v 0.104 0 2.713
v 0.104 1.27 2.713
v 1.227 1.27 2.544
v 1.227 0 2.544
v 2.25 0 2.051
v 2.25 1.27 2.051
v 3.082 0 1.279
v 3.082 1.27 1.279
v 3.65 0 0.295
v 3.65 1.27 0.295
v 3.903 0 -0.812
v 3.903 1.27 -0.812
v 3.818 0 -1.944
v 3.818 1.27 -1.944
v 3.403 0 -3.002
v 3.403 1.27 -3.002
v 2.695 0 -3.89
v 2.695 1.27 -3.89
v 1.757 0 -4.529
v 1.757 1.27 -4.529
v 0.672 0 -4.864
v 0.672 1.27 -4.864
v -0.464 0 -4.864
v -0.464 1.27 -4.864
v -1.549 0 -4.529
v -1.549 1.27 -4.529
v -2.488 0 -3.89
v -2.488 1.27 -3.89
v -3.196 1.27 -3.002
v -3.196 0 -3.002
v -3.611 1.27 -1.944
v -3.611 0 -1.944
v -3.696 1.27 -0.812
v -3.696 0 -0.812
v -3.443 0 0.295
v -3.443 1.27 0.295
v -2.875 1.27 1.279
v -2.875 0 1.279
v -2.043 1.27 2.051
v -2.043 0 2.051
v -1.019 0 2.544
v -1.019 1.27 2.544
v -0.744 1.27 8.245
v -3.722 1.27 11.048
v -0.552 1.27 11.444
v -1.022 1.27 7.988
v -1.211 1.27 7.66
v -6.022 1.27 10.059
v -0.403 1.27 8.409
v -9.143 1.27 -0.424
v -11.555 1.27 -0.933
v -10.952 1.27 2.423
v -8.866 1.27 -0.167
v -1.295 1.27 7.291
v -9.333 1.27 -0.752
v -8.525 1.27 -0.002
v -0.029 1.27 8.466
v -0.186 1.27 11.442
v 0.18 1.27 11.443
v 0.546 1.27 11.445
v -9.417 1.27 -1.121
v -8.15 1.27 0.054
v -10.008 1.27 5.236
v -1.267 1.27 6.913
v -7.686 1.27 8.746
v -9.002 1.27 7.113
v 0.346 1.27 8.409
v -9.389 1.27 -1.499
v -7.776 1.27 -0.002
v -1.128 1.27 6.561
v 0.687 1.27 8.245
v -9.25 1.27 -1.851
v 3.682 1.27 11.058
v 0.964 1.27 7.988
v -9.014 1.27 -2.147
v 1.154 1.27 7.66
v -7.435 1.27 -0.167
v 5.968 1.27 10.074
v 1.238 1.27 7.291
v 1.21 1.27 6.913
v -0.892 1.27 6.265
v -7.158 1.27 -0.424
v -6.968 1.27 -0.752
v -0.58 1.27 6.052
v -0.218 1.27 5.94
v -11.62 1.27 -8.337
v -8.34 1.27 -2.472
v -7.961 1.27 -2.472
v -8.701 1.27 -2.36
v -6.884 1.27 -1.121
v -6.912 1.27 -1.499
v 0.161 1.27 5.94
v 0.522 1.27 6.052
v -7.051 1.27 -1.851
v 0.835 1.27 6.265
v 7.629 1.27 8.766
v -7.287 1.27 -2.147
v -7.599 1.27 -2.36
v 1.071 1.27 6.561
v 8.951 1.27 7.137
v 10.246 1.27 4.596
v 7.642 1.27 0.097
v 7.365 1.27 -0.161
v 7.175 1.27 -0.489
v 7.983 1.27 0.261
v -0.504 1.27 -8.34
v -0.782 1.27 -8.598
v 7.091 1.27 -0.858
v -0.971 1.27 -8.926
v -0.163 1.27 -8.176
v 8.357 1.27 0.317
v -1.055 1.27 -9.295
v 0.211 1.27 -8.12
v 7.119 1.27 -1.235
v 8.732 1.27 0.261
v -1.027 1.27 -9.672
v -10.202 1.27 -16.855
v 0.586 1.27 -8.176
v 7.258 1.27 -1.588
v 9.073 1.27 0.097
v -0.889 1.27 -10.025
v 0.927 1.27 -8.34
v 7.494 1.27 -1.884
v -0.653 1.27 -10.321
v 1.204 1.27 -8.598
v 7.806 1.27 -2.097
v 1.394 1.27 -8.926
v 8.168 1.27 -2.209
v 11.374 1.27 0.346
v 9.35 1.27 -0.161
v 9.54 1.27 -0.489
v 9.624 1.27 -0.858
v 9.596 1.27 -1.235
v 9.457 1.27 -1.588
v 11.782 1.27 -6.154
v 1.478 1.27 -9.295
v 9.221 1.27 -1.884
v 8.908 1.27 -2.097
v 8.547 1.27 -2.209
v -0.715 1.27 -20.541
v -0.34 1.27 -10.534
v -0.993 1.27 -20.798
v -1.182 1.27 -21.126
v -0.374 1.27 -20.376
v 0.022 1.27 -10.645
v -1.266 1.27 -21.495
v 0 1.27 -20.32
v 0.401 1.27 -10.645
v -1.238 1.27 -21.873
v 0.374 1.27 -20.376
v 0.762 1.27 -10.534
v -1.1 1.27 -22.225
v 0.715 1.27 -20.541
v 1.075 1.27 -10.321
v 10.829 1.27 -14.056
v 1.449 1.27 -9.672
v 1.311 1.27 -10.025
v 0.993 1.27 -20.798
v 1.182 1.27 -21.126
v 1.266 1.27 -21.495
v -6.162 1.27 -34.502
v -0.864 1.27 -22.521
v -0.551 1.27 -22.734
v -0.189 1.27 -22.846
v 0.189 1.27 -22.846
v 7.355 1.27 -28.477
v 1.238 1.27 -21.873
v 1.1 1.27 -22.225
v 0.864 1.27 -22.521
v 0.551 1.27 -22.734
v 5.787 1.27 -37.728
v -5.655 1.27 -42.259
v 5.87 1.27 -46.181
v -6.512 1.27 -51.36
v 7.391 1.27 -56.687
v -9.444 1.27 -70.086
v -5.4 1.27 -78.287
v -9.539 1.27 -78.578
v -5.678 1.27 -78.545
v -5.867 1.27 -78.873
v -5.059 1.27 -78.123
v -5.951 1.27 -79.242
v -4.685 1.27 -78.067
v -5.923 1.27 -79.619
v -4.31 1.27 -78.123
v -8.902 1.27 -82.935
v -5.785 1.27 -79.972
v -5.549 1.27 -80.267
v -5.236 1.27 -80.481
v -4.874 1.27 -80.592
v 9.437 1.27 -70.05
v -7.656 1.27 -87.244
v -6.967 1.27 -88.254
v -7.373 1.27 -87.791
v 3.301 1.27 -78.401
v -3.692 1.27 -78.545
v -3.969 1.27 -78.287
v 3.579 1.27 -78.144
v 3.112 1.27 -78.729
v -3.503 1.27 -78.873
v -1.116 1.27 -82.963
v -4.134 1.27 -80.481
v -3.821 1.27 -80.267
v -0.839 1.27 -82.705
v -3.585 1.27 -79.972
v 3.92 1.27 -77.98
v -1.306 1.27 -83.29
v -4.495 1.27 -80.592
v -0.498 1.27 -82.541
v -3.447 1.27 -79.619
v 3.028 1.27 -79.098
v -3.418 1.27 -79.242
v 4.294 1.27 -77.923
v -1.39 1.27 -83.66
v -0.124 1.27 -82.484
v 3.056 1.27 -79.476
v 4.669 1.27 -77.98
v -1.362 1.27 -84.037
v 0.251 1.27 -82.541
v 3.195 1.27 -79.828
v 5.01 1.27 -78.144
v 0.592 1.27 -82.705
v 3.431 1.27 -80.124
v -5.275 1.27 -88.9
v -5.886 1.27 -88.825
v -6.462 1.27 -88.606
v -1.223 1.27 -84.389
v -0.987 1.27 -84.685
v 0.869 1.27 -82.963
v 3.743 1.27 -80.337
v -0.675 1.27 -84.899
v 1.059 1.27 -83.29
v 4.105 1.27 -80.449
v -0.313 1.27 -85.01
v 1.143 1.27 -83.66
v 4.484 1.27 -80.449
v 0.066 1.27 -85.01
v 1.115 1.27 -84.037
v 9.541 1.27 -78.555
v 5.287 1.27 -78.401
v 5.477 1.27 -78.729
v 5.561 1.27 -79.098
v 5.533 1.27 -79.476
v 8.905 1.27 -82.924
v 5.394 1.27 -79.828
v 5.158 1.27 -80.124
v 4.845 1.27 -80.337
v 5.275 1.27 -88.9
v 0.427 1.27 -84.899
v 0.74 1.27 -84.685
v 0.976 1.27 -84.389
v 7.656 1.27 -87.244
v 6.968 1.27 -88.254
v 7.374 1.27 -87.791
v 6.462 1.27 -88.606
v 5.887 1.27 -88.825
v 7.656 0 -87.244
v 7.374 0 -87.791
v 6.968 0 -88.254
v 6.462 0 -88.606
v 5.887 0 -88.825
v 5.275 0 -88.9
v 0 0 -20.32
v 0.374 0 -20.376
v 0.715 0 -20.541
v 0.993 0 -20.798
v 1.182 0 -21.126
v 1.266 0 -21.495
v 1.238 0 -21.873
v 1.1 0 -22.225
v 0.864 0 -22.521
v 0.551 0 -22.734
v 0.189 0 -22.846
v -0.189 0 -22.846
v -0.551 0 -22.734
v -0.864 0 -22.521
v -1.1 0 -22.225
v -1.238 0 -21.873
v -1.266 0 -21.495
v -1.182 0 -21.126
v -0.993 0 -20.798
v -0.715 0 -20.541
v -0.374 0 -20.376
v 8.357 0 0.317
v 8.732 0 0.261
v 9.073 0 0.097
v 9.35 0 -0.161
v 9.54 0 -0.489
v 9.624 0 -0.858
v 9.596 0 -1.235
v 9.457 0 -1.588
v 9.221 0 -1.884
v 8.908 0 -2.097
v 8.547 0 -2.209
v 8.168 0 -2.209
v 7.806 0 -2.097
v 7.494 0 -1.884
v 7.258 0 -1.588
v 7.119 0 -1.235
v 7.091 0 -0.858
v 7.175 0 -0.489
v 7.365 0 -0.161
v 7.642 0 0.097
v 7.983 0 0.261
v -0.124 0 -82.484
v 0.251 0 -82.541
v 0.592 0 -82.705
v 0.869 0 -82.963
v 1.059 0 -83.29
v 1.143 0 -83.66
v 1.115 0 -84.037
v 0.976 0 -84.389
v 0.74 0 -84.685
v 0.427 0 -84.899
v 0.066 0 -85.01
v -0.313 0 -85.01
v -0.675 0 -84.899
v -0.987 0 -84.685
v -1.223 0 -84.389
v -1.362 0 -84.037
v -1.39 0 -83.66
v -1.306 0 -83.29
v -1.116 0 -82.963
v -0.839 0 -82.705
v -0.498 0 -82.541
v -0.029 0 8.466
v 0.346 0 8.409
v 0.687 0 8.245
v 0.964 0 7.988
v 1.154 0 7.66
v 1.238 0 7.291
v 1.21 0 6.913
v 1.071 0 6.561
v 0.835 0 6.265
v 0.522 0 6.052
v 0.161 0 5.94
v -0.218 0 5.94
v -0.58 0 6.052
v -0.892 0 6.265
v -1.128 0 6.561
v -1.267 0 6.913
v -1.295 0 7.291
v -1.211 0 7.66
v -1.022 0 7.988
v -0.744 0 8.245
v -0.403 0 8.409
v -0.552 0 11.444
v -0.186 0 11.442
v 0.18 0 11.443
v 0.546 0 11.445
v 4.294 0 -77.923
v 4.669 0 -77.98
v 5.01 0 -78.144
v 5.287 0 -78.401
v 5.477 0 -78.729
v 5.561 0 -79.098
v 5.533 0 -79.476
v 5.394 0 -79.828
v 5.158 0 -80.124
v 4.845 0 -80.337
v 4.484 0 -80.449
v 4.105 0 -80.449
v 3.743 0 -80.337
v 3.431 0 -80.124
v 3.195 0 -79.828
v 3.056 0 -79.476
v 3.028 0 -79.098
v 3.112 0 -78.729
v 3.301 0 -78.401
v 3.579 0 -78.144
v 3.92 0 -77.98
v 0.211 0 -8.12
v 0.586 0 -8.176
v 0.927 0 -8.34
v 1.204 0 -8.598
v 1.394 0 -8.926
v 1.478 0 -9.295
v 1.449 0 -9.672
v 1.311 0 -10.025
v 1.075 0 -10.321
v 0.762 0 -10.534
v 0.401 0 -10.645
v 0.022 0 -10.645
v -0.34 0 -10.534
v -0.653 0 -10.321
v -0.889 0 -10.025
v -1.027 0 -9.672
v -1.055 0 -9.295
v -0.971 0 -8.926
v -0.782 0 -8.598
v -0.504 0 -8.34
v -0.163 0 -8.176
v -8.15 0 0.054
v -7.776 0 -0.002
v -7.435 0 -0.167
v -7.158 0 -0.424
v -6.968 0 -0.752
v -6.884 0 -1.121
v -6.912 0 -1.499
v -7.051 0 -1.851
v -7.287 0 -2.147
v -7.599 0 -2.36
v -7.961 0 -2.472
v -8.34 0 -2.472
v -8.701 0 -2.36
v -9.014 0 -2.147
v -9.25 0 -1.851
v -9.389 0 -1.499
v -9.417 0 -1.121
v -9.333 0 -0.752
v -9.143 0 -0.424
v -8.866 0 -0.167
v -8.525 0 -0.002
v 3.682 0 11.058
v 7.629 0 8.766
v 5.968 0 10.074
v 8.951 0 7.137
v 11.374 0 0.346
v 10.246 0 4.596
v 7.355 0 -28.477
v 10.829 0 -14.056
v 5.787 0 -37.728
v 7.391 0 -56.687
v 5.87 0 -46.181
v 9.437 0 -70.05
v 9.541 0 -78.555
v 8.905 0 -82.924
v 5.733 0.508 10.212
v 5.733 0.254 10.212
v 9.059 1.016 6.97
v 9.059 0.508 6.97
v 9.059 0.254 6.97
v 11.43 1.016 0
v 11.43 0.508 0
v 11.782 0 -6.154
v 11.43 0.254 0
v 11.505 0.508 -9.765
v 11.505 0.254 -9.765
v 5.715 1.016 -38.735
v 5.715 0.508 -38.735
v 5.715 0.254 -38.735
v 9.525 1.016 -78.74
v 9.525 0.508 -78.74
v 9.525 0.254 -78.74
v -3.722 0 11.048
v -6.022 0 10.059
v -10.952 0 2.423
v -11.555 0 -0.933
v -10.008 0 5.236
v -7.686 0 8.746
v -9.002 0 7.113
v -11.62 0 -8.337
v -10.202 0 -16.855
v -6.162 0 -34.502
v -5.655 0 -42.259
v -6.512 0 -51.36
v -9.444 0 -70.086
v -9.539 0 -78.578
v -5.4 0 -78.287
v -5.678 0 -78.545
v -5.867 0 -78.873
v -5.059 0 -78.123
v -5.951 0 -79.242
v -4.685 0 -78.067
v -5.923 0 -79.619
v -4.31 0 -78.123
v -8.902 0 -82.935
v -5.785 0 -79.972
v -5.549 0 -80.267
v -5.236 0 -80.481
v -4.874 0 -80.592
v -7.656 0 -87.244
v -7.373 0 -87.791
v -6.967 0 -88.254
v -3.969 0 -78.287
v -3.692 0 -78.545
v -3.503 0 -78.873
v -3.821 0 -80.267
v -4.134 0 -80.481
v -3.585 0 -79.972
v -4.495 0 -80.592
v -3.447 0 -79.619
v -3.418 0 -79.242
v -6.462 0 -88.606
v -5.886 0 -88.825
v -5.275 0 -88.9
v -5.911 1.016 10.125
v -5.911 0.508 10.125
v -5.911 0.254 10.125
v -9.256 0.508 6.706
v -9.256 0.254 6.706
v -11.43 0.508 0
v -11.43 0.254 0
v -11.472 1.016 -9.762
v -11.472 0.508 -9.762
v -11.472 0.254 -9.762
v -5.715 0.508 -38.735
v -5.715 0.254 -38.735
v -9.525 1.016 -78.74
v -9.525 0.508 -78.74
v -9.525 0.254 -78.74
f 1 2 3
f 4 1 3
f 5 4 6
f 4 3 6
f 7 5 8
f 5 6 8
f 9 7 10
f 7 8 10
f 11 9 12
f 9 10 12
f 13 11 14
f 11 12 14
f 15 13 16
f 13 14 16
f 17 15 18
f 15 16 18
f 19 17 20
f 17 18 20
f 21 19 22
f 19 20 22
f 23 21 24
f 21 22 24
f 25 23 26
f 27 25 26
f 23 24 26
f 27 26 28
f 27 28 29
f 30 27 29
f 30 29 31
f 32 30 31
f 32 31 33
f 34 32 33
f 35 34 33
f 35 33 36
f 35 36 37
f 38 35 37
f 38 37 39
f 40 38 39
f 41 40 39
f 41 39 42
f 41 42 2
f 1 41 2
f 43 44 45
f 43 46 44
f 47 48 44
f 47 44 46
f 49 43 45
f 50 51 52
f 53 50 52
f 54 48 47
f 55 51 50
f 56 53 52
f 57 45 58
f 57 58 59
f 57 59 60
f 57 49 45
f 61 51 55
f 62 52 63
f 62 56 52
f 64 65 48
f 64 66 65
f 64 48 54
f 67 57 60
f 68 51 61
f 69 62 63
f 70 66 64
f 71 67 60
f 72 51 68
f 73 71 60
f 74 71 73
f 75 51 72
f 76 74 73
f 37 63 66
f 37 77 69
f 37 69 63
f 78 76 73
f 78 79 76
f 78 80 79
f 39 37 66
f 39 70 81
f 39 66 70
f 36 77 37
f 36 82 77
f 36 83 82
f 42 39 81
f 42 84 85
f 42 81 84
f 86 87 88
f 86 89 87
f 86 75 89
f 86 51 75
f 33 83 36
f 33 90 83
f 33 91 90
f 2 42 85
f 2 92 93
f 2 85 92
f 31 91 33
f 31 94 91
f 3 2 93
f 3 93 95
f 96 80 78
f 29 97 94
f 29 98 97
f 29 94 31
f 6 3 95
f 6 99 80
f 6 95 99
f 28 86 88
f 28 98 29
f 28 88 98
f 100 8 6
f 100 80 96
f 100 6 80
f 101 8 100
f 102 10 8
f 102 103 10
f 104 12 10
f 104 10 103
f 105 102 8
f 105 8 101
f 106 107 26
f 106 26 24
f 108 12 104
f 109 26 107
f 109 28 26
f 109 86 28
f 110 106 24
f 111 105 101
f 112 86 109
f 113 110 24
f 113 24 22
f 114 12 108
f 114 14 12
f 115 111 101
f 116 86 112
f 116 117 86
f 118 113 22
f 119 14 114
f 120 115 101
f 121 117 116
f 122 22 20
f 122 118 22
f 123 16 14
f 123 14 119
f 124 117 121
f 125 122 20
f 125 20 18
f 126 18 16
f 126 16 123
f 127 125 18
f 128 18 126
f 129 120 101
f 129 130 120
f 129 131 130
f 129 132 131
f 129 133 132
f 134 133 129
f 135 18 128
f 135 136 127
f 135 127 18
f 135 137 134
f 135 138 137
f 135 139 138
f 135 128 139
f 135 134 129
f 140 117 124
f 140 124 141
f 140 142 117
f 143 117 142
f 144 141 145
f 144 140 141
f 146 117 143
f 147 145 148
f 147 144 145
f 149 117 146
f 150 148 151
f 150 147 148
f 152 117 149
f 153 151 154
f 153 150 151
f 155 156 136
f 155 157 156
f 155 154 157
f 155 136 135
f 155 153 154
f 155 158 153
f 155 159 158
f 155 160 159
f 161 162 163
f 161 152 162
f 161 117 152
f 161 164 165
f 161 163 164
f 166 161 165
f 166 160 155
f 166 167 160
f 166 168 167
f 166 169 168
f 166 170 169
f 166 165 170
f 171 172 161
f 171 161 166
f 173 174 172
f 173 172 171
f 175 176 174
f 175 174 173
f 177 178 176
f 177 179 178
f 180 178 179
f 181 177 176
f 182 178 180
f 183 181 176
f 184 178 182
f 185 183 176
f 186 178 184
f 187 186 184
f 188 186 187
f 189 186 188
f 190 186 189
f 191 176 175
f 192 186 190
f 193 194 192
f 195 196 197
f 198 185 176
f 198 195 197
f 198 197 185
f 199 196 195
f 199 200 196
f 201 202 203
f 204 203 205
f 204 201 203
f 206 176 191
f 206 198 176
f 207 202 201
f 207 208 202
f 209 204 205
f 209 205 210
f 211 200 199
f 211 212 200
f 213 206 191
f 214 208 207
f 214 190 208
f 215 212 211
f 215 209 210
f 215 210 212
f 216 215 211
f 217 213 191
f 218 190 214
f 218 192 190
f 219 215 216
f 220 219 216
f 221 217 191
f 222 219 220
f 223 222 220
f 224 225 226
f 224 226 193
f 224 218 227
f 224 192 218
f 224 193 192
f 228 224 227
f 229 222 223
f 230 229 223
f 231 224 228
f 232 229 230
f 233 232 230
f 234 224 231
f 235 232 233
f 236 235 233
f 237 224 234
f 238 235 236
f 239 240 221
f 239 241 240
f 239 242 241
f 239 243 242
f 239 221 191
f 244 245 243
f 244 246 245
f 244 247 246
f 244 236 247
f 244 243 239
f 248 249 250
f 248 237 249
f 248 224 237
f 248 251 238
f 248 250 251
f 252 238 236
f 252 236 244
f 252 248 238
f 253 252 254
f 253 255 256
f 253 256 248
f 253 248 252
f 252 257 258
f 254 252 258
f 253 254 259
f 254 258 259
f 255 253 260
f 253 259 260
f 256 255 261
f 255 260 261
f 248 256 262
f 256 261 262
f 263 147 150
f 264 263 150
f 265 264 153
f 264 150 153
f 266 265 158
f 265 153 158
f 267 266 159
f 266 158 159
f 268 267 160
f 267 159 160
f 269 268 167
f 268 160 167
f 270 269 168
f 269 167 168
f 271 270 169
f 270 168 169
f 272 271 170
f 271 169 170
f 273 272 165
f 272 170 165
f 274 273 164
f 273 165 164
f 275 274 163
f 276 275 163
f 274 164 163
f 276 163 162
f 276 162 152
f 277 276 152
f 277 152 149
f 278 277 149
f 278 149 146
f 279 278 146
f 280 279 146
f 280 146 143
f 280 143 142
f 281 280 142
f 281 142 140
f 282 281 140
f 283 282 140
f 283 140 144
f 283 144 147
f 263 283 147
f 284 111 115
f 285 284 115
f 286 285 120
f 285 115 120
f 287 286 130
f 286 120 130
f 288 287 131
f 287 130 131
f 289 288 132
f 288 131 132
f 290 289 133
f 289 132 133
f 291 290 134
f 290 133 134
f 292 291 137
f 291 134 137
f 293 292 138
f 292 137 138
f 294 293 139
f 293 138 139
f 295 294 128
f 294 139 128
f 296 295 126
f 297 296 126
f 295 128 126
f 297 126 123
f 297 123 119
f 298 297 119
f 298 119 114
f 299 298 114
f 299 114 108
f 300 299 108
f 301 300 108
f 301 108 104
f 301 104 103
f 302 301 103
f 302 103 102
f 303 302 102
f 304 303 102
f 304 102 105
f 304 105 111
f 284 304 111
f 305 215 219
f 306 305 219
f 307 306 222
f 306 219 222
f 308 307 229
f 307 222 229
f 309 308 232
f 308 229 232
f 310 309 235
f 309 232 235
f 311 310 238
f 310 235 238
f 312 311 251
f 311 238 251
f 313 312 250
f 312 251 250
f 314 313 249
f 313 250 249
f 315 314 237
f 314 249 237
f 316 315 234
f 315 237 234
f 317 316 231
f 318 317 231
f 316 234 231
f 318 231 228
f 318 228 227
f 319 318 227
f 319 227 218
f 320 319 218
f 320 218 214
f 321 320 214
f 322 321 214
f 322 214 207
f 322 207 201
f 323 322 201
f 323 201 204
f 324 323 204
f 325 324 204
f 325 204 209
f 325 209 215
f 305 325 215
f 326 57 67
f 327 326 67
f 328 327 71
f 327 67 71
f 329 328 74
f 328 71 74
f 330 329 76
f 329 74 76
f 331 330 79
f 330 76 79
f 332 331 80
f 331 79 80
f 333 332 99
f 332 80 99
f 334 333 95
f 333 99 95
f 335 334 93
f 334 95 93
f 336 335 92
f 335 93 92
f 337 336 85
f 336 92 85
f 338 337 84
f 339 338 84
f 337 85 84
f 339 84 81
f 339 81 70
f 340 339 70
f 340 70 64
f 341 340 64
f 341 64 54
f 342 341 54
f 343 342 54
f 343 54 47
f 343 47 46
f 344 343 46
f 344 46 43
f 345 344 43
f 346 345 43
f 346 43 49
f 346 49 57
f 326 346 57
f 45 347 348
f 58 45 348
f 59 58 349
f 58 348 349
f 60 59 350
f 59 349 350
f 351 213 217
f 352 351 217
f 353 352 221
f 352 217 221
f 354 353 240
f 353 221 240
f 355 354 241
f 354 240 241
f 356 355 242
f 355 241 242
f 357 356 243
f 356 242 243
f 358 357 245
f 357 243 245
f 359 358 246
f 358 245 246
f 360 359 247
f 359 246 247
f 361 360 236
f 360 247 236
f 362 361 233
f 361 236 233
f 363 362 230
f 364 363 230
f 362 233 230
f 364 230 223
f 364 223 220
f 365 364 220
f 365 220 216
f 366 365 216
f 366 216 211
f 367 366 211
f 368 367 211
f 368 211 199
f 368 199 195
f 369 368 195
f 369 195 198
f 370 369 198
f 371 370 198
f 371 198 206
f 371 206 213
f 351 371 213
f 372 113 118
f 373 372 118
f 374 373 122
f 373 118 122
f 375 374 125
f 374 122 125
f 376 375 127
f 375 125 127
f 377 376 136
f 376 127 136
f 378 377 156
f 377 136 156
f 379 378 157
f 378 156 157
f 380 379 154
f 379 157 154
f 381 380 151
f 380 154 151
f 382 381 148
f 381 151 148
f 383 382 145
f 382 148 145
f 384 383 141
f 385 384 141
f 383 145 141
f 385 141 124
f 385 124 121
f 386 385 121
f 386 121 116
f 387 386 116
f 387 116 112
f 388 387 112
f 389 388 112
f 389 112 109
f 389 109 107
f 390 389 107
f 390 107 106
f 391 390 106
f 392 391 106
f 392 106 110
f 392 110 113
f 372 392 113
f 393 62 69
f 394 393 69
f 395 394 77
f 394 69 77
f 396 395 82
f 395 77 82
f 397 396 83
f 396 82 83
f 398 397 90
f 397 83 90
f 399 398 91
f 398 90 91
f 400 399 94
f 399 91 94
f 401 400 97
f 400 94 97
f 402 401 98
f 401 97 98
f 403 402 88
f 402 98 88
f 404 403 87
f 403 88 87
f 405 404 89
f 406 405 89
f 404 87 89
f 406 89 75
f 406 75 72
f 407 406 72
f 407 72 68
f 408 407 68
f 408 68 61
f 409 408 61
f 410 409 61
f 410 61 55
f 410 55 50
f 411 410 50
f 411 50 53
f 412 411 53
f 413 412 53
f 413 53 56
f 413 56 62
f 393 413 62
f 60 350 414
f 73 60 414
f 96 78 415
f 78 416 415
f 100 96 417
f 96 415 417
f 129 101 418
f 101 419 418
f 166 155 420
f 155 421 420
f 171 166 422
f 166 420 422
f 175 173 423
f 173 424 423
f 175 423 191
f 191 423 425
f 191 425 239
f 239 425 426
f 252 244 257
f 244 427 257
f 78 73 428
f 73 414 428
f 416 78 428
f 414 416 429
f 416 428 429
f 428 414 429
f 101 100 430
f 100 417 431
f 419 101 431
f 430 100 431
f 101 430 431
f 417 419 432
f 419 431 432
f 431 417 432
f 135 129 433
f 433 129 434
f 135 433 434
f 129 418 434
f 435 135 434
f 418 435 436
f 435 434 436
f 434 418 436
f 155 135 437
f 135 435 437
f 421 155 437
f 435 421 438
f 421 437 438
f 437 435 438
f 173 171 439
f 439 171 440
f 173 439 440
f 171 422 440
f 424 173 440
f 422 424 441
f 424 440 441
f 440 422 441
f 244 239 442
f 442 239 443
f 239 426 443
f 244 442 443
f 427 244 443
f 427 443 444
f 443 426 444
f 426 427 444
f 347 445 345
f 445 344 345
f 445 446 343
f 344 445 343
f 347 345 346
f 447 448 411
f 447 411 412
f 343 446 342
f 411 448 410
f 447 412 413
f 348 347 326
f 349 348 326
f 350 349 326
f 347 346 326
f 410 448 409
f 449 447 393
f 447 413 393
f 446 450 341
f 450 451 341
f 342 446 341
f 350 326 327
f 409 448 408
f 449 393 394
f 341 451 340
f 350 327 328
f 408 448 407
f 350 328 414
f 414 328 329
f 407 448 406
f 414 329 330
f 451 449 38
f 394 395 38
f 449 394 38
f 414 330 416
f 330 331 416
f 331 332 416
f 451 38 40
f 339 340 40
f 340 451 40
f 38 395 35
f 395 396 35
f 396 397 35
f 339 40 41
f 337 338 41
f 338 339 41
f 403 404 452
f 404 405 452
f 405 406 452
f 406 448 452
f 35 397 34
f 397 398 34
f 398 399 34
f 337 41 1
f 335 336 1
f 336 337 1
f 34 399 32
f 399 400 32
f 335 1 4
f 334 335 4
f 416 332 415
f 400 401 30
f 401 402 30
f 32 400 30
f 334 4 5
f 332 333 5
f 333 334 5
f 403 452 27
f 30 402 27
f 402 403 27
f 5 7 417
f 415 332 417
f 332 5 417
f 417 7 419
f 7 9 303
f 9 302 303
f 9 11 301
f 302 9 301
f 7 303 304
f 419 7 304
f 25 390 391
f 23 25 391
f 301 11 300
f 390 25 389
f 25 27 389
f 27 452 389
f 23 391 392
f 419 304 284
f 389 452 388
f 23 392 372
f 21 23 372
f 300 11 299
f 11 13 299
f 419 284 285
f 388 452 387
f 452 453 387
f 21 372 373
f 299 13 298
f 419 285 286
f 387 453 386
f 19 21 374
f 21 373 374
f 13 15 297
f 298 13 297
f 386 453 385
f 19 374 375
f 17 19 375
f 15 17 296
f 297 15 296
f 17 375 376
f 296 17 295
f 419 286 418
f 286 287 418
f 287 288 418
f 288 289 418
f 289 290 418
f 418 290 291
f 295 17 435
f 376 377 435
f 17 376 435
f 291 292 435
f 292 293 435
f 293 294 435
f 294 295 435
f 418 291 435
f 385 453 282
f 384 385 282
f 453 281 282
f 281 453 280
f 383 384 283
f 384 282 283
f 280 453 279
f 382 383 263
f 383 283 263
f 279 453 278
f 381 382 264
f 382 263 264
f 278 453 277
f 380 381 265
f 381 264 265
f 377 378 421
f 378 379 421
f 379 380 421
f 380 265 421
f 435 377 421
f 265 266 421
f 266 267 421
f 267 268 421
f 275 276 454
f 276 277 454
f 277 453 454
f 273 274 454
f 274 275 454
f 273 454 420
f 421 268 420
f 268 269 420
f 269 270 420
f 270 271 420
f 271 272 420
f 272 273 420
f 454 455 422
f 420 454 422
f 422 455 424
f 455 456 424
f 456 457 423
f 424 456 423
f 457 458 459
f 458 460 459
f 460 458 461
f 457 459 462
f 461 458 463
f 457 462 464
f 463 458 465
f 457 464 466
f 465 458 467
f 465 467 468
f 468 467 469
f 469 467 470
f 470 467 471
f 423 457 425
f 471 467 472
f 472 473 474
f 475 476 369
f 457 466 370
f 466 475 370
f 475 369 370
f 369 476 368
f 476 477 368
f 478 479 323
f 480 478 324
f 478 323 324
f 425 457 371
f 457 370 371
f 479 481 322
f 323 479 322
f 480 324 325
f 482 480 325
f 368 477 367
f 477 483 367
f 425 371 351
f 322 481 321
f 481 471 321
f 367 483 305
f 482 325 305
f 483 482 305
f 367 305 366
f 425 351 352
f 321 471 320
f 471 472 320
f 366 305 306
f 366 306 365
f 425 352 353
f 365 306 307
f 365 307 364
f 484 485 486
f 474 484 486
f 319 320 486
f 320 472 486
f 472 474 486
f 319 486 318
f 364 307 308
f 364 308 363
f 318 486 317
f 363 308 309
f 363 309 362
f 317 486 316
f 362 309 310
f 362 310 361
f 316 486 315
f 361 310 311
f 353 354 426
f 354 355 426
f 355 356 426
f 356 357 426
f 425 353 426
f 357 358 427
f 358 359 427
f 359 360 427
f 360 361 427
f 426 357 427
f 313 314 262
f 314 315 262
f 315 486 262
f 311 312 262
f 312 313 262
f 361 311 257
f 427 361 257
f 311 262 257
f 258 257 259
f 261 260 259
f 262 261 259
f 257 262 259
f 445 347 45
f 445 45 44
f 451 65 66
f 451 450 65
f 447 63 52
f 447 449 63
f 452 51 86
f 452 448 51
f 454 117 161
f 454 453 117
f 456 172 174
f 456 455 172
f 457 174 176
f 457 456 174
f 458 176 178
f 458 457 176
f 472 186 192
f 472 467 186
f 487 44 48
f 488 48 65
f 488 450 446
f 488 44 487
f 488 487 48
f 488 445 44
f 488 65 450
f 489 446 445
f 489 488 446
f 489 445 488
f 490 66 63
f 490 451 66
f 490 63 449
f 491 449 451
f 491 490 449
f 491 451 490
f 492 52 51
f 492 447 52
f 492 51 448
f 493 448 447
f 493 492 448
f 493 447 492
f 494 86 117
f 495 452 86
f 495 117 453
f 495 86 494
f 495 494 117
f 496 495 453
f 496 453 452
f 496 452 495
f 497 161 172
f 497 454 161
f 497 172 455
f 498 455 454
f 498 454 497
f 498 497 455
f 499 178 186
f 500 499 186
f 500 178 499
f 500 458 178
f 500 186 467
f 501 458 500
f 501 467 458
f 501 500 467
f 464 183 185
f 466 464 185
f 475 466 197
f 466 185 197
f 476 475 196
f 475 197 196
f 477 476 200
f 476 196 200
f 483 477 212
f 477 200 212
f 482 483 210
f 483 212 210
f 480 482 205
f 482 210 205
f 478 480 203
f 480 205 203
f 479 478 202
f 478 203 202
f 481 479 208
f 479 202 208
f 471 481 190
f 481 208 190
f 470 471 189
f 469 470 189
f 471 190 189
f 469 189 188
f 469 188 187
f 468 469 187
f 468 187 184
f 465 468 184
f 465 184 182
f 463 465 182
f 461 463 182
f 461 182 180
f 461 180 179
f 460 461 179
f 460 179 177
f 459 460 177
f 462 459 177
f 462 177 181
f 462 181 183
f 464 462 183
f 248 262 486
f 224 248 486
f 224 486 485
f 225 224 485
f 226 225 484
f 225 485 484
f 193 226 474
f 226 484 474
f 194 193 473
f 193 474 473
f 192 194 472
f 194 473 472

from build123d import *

# Parameters (mm, degrees)
BOSS_EXTRUDE2_DEPTH = 1.27
SKETCH2_R           = 1.27
CUT_EXTRUDE1_DEPTH  = 90.688856727
F_3DSKETCH1_R       = 1.27
F_3DSKETCH1_R_2     = 3.81
CUT_EXTRUDE8_DEPTH  = 81.499781524
SKETCH4_R           = 1.27
CUT_EXTRUDE9_DEPTH  = 90.688856727


with BuildPart() as part:
    # Sketch1 → Boss-Extrude2 (new body)
    with BuildSketch(Plane(origin=(0, 0, 0), x_dir=(1, 0, 0), z_dir=(0, 1, 0))):
        with BuildLine():
            Line((5.275230634, 88.9), (-5.274680514, 88.9))
            ThreePointArc((-5.274680514, 88.9), (-6.725107784, 88.445152449), (-7.656067895, 87.24351239))
            add(Edge.make_bspline(
                [(-0.552393074, -11.443610573), (-4.892105519, -11.469042984), (-9.529424716, -8.066777439), (-14.645892482, 10.818030103), (0.652997254, 38.831677118), (-11.939039637, 68.466563532), (-8.693878789, 84.446234394), (-7.656067895, 87.24351239)],
                knots=[0.003862343, 0.003862343, 0.003862343, 0.003862343, 0.0963537, 0.162148545, 0.527592198, 0.902665046, 0.983926161, 0.983926161, 0.983926161, 0.983926161], degree=3))
            ThreePointArc((-0.552393074, -11.443610573), (-0.003084566, -11.442371375), (0.546218602, -11.445092034))
            add(Edge.make_bspline(
                [(0.546218602, -11.445092034), (4.705642382, -11.480686299), (9.426948295, -8.185590673), (14.781899316, 10.725353159), (-0.687433656, 38.828061669), (11.938501934, 68.466384766), (8.694987433, 84.446805864), (7.656404014, 87.244088984)],
                knots=[0.003867531, 0.003867531, 0.003867531, 0.003867531, 0.093613613, 0.162313612, 0.527685277, 0.902684241, 0.983933931, 0.983933931, 0.983933931, 0.983933931], degree=3))
            ThreePointArc((7.656404014, 87.244088984), (6.725405447, 88.445328034), (5.275230634, 88.9))
        make_face()
    extrude(amount=BOSS_EXTRUDE2_DEPTH)

    # Sketch2 → Cut-Extrude1 (cut, through all)
    with BuildSketch(Plane(origin=(0, 1.27, 0), x_dir=(1, 0, 0), z_dir=(0, 1, 0))):
        with Locations(Location((0, 21.59, 0), (0, 0, 270))):
            Circle(SKETCH2_R)
    extrude(amount=-CUT_EXTRUDE1_DEPTH, mode=Mode.SUBTRACT)

    # 3DSketch1 → Cut-Extrude8 (cut, through all)
    with BuildSketch(Plane(origin=(0.211318445, 3.81, -9.389591413), x_dir=(-0.014463883069433763, 0, 0.99989539257192), z_dir=(0, 1, 0))):
        with Locations(Location((0, 0, 0), (0, 0, 0.828748353))):
            Circle(F_3DSKETCH1_R)
        with Locations(Location((8.293615717, -8.242664201, 0), (0, 0, 0.828748353))):
            Circle(F_3DSKETCH1_R)
        with Locations(Location((8.293615717, 0.012335799, 0), (0, 0, 0.828748353))):
            Circle(F_3DSKETCH1_R_2)
        with Locations(Location((8.318172388, 8.267299274, 0), (0, 0, 0.828748353))):
            Circle(F_3DSKETCH1_R)
        with Locations(Location((16.587231434, 0, 0), (0, 0, 0.828748353))):
            Circle(F_3DSKETCH1_R)
    extrude(amount=-CUT_EXTRUDE8_DEPTH, mode=Mode.SUBTRACT)

    # Sketch4 → Cut-Extrude9 (cut, through all)
    with BuildSketch(Plane(origin=(0, 1.27, 0), x_dir=(1, 0, 0), z_dir=(0, 1, 0))):
        with Locations(Location((-4.684725231, 79.336510379, 0), (0, 0, 270))):
            Circle(SKETCH4_R)
        with Locations(Location((-0.123545977, 83.754444717, 0), (0, 0, 270))):
            Circle(SKETCH4_R)
        with Locations(Location((4.294388361, 79.193265463, 0), (0, 0, 270))):
            Circle(SKETCH4_R)
    extrude(amount=-CUT_EXTRUDE9_DEPTH, mode=Mode.SUBTRACT)


solid = part.part
